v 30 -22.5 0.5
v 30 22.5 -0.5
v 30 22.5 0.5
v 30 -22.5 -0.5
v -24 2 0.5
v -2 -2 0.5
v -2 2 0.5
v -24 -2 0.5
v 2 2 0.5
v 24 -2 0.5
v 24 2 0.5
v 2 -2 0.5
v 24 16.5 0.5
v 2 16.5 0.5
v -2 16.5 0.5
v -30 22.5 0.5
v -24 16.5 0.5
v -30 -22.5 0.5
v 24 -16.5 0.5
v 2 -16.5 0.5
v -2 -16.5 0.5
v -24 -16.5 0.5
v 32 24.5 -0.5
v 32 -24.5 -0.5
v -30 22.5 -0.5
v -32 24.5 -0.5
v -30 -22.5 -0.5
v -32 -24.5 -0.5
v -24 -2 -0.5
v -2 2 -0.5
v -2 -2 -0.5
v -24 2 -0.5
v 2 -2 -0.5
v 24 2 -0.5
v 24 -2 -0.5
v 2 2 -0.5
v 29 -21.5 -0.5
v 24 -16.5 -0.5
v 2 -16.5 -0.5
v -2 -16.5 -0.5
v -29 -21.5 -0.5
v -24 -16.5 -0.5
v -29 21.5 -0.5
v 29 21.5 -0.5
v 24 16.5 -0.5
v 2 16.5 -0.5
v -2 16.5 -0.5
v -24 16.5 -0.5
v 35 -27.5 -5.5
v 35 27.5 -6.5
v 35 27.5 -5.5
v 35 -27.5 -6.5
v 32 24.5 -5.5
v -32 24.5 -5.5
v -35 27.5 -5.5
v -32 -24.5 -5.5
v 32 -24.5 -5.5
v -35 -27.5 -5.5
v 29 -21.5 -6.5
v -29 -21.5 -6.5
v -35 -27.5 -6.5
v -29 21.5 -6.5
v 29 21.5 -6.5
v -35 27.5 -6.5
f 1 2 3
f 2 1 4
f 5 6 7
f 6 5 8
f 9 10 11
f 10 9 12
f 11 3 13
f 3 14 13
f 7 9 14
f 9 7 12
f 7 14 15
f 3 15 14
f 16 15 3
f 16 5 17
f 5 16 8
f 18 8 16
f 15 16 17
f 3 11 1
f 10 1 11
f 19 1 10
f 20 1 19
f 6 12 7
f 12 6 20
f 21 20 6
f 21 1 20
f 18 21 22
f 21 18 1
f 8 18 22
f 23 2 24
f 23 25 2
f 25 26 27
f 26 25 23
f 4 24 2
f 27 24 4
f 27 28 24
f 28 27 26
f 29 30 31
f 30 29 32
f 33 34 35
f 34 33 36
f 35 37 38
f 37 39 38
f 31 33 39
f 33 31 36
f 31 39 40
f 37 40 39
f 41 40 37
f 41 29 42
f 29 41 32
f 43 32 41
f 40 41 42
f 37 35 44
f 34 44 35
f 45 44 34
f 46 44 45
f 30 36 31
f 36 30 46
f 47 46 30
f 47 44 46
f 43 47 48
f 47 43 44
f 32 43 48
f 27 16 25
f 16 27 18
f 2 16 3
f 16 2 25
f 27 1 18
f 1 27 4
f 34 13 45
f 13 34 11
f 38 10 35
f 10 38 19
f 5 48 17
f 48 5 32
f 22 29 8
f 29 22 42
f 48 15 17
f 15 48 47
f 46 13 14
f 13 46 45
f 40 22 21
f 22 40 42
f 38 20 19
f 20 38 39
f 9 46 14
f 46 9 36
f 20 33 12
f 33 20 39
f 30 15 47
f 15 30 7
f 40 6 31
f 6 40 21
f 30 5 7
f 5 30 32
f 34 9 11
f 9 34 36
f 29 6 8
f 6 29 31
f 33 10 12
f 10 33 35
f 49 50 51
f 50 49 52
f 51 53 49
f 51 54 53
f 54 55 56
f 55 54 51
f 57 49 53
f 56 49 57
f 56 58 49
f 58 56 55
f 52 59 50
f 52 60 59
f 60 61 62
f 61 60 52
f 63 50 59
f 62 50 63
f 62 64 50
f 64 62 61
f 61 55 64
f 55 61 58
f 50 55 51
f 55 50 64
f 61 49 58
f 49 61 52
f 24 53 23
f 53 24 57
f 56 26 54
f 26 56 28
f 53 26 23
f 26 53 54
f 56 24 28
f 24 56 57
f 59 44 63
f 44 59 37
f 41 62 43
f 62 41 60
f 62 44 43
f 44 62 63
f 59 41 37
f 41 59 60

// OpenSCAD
// window
// @author Ilya Protasov

/*
TODO
- complete step
- complete front side of frame
- gap_width
- gap_thick

- back side of frame
*/

window_width = 60;
window_height = 45;
window_thick = 1;
window_frame_width = 6;
window_central_width = 4;

frame_thick = 1;
frame_width = 6;
frame_step_in = 1;
frame_step_out = 2;
frame_step_depth = 5;

// gap between window and frame
gap_window_width = .2;

module window(width, height, thick) { 
    difference() {
       cube([width, height, thick], true);
       cube([width - window_frame_width * 2, 
             height - window_frame_width * 2, thick * 1.01],         true); 
    }
    // cross
    cube([window_central_width, height, thick], true);
    cube([width, window_central_width, thick], true);
}

module frame(width, height, thick) {
    difference() {
       union() {
           // outer
           cube([width + (frame_width - frame_step_in) * 2, 
                height + (frame_width - frame_step_in) * 2, 
                thick], true);
           // inner step
           translate([0, 0, (frame_step_depth + thick)/2])  
                cube([width + (frame_step_out) * 2, 
                    height + (frame_step_out) * 2, 
                    frame_step_depth], true);
       }
       
       translate([0, 0, frame_step_depth/2])
       cube([width - frame_step_in * 2, 
             height - frame_step_in * 2, 
             (thick + frame_thick + frame_step_depth) * 1.01],         true); 
    }
}

#window(window_width, window_height, window_thick);
color("lightYellow") 
 translate([0, 0, -window_thick - frame_step_depth]) 
    frame(width = window_width, 
          height = window_height, 
          thick = window_thick);

*color("lightYellow") cube([200, 150, .5], true);
